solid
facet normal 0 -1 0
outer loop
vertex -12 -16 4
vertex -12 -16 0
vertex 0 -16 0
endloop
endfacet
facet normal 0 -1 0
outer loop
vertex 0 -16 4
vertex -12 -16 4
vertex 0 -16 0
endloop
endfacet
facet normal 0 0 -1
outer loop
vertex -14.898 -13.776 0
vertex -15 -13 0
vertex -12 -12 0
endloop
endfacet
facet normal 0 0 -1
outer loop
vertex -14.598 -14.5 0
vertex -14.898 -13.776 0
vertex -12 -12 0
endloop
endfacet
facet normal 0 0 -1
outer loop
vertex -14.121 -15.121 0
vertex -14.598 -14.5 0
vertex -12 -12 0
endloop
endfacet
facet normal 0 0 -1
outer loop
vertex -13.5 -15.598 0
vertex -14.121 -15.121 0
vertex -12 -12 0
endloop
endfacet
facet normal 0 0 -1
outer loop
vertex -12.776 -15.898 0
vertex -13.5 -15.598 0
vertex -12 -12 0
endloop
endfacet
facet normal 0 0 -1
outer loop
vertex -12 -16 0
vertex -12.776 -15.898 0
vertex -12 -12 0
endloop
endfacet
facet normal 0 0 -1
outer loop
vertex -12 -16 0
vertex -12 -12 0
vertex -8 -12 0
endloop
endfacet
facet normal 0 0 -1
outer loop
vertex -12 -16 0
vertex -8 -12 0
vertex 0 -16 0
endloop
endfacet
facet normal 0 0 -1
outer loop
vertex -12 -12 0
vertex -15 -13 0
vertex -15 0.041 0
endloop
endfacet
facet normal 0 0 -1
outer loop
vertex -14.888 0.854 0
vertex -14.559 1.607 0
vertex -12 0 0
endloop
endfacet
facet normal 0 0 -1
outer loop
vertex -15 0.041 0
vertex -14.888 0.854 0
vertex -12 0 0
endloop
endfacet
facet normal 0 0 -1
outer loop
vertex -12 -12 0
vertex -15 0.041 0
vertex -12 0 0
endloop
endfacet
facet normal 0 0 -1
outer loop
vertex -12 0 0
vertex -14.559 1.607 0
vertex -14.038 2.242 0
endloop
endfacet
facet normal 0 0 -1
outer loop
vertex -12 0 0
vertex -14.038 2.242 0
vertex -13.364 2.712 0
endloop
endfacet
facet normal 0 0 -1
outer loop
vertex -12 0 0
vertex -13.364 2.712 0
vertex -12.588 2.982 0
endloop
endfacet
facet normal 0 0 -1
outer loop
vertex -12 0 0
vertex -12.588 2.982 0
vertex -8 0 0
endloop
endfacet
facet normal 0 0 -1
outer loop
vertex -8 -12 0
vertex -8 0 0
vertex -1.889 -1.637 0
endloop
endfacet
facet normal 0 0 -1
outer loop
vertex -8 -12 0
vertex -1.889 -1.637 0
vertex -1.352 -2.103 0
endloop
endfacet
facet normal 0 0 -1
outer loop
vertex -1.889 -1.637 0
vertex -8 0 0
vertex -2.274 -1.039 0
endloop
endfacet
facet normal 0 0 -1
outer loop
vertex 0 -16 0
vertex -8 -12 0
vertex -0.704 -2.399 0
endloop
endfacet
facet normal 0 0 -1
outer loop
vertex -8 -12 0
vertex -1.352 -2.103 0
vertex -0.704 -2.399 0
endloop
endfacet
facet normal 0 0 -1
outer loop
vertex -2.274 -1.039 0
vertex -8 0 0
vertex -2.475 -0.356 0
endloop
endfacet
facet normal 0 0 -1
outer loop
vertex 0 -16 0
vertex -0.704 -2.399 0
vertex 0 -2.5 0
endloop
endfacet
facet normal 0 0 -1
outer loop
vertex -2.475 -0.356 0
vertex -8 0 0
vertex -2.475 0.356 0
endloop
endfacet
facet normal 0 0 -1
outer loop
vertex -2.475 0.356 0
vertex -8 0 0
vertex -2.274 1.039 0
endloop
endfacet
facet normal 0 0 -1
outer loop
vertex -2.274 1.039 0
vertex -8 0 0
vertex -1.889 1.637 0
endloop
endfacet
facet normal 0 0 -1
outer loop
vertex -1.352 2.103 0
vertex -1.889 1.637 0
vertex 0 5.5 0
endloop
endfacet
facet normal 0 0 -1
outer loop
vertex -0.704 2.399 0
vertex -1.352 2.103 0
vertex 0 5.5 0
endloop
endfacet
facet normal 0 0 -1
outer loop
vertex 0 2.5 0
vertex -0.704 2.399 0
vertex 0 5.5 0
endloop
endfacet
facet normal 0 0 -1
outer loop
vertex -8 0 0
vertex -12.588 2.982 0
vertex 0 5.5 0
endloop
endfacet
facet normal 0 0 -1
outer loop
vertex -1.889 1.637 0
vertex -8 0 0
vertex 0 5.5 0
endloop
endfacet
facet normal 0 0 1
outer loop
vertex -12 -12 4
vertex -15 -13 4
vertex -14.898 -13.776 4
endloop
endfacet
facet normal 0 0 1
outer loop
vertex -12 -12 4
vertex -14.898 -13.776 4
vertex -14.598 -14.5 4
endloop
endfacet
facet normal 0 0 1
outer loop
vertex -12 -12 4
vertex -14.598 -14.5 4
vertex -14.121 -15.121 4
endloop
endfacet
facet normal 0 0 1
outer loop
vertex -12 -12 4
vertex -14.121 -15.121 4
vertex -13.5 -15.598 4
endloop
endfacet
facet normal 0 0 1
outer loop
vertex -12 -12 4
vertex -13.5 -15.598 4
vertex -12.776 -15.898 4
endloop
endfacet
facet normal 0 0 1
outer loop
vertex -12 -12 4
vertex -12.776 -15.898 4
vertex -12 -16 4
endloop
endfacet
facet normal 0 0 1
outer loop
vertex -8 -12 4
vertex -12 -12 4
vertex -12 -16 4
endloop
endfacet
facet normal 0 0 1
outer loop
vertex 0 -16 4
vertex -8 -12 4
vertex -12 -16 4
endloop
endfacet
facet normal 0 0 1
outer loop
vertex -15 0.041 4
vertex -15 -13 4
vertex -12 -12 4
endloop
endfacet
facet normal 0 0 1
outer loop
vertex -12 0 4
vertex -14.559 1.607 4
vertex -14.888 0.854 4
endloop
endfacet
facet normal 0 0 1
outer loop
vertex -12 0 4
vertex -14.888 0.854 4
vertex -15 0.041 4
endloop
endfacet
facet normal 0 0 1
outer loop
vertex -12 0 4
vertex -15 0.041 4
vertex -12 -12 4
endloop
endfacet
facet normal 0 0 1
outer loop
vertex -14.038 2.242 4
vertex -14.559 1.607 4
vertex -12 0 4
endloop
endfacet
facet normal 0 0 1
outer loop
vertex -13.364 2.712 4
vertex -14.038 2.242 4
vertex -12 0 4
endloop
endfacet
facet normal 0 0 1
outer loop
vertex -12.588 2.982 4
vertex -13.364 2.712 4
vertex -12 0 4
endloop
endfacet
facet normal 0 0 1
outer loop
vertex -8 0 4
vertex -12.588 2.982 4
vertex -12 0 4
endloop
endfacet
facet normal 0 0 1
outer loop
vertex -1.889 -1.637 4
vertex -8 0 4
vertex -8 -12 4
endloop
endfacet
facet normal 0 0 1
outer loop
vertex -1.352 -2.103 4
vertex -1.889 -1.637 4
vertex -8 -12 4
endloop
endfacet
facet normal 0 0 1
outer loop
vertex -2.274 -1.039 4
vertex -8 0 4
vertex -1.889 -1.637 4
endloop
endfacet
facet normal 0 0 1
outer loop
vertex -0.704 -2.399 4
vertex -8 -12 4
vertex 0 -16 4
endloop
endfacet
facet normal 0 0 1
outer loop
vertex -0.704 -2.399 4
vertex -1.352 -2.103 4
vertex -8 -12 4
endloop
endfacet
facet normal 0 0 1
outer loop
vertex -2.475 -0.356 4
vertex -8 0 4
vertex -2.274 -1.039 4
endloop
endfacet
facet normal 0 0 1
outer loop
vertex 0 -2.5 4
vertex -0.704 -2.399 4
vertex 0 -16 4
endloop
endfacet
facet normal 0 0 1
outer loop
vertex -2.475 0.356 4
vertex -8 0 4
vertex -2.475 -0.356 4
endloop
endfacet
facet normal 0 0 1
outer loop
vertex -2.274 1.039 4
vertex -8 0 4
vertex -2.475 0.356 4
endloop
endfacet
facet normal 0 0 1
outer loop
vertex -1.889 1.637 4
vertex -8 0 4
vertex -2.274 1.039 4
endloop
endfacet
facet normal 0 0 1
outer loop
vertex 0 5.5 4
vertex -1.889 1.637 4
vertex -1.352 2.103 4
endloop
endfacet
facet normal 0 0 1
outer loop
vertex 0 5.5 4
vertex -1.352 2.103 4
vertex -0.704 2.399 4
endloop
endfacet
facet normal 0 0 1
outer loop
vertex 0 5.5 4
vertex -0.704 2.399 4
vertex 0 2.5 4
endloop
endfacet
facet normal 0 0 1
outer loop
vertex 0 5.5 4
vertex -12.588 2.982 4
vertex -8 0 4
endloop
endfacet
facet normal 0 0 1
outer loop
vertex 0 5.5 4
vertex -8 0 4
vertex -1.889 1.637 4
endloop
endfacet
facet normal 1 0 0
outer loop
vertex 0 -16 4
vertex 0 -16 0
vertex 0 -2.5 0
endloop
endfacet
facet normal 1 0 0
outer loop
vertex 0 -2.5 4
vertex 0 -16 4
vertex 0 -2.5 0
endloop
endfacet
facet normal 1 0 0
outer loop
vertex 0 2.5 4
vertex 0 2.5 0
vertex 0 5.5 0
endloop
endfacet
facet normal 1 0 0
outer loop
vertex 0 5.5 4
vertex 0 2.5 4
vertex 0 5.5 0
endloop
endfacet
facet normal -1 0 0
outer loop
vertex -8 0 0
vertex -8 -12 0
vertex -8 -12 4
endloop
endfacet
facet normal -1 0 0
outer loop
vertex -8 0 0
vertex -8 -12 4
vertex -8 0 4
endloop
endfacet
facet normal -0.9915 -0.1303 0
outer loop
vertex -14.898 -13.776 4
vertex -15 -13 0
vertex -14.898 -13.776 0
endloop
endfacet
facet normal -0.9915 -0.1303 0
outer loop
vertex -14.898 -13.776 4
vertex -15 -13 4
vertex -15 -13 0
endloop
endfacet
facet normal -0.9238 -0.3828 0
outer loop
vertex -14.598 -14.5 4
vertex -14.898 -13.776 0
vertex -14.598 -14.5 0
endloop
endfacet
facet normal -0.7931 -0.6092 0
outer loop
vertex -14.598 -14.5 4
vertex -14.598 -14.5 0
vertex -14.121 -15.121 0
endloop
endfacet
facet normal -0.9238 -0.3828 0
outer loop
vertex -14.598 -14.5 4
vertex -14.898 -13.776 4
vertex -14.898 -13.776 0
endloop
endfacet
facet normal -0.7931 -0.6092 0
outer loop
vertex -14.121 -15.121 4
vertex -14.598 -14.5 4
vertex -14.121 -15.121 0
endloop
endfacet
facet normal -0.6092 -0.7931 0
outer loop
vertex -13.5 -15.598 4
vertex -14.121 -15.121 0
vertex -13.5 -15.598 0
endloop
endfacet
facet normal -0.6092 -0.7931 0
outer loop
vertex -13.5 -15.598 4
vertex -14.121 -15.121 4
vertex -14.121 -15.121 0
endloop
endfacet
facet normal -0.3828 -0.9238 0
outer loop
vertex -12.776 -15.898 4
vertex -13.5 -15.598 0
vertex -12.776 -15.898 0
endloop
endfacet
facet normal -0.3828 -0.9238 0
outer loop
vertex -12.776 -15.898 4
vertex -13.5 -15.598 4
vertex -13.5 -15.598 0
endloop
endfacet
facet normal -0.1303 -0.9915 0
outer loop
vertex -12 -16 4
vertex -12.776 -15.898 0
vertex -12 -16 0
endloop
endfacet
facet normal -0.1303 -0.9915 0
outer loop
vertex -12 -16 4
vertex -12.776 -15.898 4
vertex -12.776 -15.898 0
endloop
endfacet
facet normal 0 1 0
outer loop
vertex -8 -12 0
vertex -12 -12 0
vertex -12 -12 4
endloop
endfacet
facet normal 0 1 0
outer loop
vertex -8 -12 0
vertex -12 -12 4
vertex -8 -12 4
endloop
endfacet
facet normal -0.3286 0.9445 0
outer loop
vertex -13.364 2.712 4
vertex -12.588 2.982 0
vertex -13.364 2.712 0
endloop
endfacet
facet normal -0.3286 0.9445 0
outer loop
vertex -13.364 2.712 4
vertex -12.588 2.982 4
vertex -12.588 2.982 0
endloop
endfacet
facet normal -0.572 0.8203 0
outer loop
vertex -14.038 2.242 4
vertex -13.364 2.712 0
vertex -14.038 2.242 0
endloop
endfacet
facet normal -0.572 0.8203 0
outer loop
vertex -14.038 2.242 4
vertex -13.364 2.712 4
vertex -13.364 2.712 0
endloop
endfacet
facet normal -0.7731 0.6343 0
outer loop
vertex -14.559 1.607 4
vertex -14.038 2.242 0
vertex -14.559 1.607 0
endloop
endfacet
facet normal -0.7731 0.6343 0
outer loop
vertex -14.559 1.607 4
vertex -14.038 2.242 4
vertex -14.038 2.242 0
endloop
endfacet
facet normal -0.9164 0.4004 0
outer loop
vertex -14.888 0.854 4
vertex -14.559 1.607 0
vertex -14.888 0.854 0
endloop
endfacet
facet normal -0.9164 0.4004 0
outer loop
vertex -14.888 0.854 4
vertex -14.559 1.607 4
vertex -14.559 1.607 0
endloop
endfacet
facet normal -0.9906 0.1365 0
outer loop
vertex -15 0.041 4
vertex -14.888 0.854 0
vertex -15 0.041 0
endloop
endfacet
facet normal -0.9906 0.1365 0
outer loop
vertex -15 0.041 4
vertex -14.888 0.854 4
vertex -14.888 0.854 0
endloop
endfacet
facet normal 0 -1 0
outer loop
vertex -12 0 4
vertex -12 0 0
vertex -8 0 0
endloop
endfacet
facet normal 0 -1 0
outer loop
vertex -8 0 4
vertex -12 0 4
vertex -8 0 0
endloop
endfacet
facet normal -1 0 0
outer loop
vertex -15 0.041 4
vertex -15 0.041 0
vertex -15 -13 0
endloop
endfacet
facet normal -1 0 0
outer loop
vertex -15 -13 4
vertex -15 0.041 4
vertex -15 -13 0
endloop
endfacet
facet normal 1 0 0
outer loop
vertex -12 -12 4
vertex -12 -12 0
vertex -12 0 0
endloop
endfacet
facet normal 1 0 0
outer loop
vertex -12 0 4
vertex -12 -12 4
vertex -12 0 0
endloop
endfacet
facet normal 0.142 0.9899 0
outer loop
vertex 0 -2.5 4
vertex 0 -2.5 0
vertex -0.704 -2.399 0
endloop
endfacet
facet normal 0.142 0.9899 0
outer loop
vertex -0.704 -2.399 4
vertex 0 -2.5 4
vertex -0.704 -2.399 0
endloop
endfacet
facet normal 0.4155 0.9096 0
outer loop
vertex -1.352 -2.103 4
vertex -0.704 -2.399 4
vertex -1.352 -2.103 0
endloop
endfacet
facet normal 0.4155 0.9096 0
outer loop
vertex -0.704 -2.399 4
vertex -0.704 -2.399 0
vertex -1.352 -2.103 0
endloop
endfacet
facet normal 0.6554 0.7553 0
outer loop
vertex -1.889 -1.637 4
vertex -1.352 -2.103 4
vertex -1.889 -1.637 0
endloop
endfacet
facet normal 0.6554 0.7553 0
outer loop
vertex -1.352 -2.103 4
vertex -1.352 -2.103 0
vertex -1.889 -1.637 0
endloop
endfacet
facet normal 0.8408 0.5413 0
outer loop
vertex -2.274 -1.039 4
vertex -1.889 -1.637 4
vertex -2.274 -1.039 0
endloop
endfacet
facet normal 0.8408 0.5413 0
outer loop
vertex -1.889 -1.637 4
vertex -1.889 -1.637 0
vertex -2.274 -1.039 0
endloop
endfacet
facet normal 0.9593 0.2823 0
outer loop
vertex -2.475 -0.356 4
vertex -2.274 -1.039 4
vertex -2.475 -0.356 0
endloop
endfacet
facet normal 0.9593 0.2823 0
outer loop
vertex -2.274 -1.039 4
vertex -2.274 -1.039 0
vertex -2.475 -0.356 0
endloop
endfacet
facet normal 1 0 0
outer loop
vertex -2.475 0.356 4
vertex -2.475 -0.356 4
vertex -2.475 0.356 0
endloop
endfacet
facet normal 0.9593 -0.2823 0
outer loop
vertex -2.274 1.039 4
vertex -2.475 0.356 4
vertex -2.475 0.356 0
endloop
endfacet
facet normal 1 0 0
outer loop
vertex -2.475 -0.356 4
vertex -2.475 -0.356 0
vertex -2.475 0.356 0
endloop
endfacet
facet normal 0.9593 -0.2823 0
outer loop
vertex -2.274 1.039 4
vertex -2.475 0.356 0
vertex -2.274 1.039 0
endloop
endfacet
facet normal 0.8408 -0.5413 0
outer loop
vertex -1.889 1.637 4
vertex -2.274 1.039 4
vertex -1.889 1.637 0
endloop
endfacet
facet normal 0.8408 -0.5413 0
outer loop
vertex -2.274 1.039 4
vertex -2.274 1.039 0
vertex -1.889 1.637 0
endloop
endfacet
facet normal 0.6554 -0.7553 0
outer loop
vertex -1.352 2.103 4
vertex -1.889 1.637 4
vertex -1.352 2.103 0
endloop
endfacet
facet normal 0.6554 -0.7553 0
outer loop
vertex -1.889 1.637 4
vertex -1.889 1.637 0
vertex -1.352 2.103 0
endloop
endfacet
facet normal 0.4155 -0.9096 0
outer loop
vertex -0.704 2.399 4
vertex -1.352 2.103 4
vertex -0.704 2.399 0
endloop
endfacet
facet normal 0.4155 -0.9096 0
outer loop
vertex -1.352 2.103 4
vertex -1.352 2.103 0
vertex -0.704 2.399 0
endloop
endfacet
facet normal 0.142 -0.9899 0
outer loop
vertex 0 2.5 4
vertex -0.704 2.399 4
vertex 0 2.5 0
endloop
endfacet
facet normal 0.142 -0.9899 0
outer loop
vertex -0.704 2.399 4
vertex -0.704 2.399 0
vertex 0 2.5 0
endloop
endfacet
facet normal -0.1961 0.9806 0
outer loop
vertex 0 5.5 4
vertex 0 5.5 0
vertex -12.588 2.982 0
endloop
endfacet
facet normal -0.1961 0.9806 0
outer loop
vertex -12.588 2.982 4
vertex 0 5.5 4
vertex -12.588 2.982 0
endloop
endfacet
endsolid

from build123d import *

# Parameters (mm, degrees)
SKETCH_1_W      = 4
SKETCH_1_H      = 12
EXTRUDE_1_DEPTH = 4
FILLET_1_R      = 3


with BuildPart() as part:
    # ｽｹｯﾁ1 → ﾎﾞｽ - 押し出し1 (new body)
    with BuildSketch(Plane.XY):
        with BuildLine():
            Line((0, 2.5), (0, 5.5))
            Line((0, 5.5), (-15, 2.5))
            Line((-15, 2.5), (-15, -16))
            Line((-15, -16), (0, -16))
            Line((0, -16), (0, -2.5))
            ThreePointArc((0, -2.5), (-2.5, 0), (0, 2.5))
        make_face()
        with Locations((-10, -6)):
            Rectangle(SKETCH_1_W, SKETCH_1_H, mode=Mode.SUBTRACT)
    extrude(amount=EXTRUDE_1_DEPTH)

    # ﾌｨﾚｯﾄ1
    fillet_1_edges = [part.edges().sort_by_distance(p)[0] for p in [
        (-15, -16, 2),
        (-15, 2.5, 2),
    ]]
    fillet(fillet_1_edges, radius=FILLET_1_R)


solid = part.part
